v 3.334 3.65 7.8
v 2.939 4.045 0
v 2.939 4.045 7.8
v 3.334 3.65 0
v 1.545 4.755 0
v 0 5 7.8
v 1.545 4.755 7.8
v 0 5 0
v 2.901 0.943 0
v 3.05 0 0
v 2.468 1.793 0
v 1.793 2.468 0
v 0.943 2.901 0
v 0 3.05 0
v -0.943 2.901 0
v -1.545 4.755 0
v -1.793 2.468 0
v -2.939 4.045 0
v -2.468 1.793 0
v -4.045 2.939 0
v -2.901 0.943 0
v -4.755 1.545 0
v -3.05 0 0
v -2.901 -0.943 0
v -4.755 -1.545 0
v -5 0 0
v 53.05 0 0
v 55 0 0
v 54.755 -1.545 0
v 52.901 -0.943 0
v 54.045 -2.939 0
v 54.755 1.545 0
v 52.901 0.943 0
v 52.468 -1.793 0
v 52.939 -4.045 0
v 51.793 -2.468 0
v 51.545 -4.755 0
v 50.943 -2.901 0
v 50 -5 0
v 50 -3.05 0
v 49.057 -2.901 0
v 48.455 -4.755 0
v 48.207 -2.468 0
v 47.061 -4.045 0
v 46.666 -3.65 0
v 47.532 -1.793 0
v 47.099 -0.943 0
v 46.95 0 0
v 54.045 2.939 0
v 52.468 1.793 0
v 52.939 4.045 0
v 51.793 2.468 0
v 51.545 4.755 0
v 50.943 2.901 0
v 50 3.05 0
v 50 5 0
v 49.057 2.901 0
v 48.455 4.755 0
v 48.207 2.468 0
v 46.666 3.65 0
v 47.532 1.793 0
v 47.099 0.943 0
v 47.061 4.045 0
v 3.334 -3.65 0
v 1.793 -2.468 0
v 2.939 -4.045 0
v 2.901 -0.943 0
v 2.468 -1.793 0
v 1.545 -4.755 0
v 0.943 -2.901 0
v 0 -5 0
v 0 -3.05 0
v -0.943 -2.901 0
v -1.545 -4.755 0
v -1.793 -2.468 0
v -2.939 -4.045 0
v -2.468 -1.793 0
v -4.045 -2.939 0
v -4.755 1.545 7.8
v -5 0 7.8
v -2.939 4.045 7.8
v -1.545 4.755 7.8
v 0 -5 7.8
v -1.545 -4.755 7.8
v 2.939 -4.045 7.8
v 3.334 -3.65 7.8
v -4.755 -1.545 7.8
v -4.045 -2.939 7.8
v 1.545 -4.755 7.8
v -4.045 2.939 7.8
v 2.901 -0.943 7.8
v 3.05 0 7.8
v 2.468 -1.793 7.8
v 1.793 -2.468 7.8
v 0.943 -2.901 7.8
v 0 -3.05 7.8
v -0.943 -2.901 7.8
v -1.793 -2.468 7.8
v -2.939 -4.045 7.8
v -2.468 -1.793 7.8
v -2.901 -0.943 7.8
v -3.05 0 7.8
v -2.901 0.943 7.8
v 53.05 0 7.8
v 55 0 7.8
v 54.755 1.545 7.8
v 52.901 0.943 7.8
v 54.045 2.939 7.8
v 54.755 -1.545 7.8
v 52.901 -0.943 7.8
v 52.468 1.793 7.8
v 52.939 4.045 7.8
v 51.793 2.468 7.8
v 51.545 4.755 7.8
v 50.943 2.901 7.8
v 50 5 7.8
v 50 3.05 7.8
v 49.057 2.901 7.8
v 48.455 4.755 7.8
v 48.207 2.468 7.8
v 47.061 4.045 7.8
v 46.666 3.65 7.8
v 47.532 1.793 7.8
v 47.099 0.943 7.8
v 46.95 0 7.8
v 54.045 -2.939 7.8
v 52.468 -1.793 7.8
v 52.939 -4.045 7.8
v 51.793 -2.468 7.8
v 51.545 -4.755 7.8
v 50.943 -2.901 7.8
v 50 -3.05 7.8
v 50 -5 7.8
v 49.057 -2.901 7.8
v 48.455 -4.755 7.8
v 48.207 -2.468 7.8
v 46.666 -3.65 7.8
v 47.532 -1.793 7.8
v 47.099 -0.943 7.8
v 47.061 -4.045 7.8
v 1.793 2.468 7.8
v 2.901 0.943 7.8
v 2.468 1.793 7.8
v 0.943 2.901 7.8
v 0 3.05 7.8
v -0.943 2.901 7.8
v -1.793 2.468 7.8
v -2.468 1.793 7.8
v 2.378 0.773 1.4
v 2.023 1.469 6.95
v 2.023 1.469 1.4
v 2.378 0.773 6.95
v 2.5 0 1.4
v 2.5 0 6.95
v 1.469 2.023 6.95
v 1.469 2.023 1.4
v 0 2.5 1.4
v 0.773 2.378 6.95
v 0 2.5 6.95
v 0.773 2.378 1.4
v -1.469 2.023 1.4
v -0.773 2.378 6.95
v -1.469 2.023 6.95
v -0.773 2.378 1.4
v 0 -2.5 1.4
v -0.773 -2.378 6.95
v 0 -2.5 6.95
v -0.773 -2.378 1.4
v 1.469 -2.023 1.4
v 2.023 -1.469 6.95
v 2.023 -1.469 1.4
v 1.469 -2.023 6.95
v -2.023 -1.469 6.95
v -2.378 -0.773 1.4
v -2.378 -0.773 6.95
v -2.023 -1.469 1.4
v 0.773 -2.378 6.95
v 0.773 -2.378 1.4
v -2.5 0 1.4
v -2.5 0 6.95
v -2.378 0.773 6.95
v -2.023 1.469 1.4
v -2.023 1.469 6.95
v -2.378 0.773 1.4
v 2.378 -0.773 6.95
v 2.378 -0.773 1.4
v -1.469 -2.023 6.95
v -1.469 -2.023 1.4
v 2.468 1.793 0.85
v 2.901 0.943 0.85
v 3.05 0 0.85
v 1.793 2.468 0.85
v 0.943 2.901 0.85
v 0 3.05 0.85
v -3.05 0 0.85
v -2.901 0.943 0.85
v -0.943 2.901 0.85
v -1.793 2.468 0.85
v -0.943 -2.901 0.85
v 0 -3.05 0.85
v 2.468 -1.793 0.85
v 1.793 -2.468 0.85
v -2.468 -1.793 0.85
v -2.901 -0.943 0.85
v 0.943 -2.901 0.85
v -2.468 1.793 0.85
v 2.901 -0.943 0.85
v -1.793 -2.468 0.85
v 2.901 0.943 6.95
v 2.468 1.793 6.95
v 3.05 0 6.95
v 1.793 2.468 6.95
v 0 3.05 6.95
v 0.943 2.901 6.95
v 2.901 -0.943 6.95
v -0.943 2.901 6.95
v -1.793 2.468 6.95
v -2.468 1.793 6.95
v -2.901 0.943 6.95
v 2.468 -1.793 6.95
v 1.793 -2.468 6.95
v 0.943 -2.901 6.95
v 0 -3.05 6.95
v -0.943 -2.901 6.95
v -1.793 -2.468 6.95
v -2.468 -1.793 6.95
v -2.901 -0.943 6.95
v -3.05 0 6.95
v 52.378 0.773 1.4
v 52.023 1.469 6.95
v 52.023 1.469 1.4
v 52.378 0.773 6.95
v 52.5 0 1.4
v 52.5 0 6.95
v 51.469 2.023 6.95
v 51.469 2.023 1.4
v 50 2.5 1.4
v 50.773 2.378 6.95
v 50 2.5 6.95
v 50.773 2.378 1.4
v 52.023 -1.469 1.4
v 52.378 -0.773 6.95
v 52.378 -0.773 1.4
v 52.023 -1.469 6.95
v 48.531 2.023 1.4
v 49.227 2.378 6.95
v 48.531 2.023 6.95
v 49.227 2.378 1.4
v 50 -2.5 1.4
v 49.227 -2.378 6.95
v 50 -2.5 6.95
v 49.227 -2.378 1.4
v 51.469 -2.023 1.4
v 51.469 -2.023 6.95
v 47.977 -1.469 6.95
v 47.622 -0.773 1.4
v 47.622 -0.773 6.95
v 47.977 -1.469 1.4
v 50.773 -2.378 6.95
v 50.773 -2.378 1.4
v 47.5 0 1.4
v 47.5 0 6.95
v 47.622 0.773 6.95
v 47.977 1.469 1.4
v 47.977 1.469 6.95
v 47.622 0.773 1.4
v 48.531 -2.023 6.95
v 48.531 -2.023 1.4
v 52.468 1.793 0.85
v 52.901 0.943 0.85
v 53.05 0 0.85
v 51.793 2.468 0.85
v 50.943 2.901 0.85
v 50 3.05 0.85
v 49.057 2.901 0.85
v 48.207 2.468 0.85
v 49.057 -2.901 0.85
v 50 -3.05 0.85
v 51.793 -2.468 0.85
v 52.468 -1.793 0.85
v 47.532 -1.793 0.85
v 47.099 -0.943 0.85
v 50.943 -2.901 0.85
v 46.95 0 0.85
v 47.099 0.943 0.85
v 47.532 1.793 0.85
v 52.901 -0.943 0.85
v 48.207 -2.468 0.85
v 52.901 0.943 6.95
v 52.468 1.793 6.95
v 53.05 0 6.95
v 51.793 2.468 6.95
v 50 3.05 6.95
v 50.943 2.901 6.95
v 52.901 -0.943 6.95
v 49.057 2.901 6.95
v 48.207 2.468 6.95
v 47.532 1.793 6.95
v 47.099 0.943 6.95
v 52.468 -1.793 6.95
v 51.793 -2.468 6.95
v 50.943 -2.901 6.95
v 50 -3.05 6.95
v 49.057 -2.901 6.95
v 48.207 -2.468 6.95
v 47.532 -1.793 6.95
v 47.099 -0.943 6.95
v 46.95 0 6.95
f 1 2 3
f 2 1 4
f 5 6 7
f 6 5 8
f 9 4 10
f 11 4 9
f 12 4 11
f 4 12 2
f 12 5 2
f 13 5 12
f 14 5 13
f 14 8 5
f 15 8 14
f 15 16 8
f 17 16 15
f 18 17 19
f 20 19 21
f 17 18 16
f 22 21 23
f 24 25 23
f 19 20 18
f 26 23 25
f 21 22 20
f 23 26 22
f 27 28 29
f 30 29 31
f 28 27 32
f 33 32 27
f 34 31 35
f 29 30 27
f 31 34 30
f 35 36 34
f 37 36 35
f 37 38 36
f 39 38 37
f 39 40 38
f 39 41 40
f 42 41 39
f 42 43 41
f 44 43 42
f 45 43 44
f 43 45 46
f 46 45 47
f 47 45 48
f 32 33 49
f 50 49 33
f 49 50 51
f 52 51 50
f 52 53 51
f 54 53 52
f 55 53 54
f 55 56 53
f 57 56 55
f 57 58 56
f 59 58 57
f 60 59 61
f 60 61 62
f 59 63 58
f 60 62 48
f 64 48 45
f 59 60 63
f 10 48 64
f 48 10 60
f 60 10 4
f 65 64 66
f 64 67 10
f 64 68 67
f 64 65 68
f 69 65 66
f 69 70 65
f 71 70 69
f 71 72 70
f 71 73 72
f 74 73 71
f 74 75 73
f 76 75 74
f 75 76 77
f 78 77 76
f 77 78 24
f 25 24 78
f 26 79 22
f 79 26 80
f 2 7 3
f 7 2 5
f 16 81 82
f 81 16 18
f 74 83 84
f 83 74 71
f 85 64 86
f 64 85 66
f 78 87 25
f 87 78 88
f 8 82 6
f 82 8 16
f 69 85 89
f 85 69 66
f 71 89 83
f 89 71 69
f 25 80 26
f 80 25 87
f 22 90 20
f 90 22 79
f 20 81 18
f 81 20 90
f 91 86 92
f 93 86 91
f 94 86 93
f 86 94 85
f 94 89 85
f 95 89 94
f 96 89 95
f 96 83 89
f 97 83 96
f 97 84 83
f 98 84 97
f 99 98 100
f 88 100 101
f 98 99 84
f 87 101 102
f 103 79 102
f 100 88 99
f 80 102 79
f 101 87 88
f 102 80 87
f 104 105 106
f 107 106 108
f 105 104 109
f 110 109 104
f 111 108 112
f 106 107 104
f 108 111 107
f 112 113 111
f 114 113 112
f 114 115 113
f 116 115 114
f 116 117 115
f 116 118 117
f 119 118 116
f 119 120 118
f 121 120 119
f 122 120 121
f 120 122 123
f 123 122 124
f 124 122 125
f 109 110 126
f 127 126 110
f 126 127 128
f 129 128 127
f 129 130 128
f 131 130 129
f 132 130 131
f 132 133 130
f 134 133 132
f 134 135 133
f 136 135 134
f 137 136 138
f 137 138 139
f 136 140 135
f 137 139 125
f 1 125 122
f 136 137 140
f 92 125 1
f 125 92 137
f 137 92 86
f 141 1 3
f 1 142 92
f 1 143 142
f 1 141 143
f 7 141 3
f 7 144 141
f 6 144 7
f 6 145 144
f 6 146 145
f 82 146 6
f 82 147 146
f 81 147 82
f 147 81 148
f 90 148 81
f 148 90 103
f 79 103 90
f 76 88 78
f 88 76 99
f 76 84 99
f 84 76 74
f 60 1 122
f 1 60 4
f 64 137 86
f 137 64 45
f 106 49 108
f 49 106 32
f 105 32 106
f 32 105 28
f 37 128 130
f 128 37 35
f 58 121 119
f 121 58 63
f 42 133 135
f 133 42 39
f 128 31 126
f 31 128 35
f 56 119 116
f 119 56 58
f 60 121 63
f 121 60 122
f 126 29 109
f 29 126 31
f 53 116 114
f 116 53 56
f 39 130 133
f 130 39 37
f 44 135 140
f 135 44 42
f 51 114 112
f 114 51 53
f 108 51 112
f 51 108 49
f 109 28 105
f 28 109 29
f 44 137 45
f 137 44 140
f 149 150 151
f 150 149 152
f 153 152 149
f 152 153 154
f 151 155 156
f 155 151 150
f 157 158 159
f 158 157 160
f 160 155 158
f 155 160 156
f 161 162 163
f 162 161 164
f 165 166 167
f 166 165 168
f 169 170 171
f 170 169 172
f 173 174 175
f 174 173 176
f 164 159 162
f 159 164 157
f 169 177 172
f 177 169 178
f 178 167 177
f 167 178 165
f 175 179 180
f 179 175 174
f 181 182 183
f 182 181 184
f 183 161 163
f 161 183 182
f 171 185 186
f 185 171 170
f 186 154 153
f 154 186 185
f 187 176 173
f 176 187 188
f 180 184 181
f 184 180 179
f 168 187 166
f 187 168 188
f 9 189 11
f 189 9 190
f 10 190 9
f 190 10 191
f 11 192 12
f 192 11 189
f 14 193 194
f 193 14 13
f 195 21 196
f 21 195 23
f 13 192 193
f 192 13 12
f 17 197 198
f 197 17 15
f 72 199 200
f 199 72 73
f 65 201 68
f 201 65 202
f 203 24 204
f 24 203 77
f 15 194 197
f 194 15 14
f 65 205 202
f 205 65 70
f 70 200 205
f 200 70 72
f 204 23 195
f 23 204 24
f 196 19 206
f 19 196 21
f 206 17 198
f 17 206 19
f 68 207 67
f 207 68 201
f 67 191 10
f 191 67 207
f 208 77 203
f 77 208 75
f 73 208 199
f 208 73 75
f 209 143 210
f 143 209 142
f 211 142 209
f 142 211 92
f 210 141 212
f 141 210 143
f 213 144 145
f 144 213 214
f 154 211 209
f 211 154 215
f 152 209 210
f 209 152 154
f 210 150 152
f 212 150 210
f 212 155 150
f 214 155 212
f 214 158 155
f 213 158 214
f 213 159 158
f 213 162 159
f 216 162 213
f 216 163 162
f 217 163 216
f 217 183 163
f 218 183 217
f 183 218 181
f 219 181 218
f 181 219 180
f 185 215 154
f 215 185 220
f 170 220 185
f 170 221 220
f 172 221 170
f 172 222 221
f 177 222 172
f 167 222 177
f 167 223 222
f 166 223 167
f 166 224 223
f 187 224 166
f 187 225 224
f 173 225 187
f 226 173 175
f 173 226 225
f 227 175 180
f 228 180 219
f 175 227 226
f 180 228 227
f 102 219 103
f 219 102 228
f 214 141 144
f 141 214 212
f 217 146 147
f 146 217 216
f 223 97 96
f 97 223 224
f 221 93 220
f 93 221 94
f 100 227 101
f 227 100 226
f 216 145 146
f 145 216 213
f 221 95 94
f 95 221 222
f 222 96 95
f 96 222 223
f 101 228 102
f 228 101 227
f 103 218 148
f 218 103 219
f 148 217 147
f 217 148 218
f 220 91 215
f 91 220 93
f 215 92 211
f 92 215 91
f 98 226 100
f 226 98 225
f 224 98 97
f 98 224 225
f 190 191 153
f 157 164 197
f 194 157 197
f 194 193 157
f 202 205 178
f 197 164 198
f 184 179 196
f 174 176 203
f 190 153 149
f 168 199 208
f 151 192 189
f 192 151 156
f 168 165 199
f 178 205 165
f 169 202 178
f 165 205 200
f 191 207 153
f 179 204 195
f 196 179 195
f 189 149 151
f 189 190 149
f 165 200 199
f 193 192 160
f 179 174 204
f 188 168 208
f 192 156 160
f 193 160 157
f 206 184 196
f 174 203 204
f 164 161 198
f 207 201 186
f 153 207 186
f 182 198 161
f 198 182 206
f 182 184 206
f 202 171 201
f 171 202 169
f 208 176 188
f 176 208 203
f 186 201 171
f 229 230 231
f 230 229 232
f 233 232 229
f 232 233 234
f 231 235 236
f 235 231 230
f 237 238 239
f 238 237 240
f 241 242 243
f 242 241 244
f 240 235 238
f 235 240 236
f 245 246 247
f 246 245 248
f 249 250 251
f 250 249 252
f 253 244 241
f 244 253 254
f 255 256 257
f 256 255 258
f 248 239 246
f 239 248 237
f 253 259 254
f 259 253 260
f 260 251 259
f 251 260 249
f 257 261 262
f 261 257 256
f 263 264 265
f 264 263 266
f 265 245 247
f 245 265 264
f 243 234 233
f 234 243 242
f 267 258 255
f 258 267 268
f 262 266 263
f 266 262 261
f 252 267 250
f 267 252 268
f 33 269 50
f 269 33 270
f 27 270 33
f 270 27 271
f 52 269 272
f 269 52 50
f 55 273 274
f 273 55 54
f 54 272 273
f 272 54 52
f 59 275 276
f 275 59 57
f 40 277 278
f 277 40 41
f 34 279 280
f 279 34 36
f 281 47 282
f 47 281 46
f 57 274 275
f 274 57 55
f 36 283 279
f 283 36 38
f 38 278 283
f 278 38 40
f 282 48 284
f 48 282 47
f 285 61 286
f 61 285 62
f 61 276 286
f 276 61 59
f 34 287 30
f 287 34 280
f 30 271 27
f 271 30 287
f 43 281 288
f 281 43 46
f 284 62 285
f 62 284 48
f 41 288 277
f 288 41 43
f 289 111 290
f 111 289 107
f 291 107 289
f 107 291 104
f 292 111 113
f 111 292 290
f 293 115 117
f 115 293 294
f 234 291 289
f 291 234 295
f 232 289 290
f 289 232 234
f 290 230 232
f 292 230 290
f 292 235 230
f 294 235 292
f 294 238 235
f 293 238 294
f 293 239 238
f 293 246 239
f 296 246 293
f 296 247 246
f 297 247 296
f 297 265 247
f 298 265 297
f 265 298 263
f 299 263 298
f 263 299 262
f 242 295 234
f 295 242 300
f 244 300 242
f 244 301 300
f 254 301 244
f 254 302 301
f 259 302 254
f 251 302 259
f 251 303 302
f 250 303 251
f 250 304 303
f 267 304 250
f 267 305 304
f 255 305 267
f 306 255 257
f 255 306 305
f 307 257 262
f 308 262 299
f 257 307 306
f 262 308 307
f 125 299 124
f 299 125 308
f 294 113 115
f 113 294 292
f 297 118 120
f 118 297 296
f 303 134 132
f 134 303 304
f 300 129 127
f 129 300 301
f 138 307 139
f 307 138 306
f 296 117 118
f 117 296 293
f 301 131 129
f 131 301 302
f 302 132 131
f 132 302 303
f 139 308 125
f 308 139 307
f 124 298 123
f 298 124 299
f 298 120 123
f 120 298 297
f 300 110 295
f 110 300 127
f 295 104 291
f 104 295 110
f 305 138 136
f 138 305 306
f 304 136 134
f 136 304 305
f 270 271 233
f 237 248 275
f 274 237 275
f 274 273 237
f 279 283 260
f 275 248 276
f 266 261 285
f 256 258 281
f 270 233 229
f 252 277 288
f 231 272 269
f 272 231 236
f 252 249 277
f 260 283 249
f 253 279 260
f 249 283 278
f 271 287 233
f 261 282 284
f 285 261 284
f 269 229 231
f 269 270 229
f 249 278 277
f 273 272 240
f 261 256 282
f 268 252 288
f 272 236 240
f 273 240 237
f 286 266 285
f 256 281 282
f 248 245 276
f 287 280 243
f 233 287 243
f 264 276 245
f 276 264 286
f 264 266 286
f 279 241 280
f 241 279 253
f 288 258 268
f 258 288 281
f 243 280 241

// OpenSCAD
/*      
Customizable freeform-2-hole LEGO Technic Connector Bone
Jens Henrik Sandell
July 2016
Updated December 2016

Created by forking the thing:629875
        Customizable Curved LEGO Technic Beam
        Steve Medwin
        January 2015
*/
$fn=20*1.0;
// preview[view:north east, tilt:top]

// constants
width = 7.3*1.0; // beam width
height = 7.8*1.0; // beam height
hole = 5.0/2; // hole diameter
counter = 6.1/2; // countersink diameter
depth = 0.85*1.0; // countersink depth
pitch = 8.0*1.0; // distance between holes

// user parameters
// distance between holes =
Distance1 = 50; // [20:100]
// width of knuckle and ends =
Knuckle = 10; // [8:16]

// calculations
// create beam
difference()
{
	union(){
		cylinder(h=height, r=Knuckle/2);
		translate([0,-width/2,0]) cube([Distance1,width,height]);
		translate([Distance1,0,0]) cylinder(h=height,r=Knuckle/2);
	}
	for (i=[0:1]) {
		translate([i*Distance1,0,0]) {
			translate([0,0,-2])
			cylinder(h=height+4, r=hole);
                
			translate([0,0,-0.01])
			cylinder(h=depth+0.01, r=counter);      
                
			translate([0,0,height-depth])
			cylinder(h=depth+0.01, r=counter);
                
			translate([0,0,depth])
			cylinder(h=(counter - hole), r1=counter, r2=hole);           
		}    
	}
}
